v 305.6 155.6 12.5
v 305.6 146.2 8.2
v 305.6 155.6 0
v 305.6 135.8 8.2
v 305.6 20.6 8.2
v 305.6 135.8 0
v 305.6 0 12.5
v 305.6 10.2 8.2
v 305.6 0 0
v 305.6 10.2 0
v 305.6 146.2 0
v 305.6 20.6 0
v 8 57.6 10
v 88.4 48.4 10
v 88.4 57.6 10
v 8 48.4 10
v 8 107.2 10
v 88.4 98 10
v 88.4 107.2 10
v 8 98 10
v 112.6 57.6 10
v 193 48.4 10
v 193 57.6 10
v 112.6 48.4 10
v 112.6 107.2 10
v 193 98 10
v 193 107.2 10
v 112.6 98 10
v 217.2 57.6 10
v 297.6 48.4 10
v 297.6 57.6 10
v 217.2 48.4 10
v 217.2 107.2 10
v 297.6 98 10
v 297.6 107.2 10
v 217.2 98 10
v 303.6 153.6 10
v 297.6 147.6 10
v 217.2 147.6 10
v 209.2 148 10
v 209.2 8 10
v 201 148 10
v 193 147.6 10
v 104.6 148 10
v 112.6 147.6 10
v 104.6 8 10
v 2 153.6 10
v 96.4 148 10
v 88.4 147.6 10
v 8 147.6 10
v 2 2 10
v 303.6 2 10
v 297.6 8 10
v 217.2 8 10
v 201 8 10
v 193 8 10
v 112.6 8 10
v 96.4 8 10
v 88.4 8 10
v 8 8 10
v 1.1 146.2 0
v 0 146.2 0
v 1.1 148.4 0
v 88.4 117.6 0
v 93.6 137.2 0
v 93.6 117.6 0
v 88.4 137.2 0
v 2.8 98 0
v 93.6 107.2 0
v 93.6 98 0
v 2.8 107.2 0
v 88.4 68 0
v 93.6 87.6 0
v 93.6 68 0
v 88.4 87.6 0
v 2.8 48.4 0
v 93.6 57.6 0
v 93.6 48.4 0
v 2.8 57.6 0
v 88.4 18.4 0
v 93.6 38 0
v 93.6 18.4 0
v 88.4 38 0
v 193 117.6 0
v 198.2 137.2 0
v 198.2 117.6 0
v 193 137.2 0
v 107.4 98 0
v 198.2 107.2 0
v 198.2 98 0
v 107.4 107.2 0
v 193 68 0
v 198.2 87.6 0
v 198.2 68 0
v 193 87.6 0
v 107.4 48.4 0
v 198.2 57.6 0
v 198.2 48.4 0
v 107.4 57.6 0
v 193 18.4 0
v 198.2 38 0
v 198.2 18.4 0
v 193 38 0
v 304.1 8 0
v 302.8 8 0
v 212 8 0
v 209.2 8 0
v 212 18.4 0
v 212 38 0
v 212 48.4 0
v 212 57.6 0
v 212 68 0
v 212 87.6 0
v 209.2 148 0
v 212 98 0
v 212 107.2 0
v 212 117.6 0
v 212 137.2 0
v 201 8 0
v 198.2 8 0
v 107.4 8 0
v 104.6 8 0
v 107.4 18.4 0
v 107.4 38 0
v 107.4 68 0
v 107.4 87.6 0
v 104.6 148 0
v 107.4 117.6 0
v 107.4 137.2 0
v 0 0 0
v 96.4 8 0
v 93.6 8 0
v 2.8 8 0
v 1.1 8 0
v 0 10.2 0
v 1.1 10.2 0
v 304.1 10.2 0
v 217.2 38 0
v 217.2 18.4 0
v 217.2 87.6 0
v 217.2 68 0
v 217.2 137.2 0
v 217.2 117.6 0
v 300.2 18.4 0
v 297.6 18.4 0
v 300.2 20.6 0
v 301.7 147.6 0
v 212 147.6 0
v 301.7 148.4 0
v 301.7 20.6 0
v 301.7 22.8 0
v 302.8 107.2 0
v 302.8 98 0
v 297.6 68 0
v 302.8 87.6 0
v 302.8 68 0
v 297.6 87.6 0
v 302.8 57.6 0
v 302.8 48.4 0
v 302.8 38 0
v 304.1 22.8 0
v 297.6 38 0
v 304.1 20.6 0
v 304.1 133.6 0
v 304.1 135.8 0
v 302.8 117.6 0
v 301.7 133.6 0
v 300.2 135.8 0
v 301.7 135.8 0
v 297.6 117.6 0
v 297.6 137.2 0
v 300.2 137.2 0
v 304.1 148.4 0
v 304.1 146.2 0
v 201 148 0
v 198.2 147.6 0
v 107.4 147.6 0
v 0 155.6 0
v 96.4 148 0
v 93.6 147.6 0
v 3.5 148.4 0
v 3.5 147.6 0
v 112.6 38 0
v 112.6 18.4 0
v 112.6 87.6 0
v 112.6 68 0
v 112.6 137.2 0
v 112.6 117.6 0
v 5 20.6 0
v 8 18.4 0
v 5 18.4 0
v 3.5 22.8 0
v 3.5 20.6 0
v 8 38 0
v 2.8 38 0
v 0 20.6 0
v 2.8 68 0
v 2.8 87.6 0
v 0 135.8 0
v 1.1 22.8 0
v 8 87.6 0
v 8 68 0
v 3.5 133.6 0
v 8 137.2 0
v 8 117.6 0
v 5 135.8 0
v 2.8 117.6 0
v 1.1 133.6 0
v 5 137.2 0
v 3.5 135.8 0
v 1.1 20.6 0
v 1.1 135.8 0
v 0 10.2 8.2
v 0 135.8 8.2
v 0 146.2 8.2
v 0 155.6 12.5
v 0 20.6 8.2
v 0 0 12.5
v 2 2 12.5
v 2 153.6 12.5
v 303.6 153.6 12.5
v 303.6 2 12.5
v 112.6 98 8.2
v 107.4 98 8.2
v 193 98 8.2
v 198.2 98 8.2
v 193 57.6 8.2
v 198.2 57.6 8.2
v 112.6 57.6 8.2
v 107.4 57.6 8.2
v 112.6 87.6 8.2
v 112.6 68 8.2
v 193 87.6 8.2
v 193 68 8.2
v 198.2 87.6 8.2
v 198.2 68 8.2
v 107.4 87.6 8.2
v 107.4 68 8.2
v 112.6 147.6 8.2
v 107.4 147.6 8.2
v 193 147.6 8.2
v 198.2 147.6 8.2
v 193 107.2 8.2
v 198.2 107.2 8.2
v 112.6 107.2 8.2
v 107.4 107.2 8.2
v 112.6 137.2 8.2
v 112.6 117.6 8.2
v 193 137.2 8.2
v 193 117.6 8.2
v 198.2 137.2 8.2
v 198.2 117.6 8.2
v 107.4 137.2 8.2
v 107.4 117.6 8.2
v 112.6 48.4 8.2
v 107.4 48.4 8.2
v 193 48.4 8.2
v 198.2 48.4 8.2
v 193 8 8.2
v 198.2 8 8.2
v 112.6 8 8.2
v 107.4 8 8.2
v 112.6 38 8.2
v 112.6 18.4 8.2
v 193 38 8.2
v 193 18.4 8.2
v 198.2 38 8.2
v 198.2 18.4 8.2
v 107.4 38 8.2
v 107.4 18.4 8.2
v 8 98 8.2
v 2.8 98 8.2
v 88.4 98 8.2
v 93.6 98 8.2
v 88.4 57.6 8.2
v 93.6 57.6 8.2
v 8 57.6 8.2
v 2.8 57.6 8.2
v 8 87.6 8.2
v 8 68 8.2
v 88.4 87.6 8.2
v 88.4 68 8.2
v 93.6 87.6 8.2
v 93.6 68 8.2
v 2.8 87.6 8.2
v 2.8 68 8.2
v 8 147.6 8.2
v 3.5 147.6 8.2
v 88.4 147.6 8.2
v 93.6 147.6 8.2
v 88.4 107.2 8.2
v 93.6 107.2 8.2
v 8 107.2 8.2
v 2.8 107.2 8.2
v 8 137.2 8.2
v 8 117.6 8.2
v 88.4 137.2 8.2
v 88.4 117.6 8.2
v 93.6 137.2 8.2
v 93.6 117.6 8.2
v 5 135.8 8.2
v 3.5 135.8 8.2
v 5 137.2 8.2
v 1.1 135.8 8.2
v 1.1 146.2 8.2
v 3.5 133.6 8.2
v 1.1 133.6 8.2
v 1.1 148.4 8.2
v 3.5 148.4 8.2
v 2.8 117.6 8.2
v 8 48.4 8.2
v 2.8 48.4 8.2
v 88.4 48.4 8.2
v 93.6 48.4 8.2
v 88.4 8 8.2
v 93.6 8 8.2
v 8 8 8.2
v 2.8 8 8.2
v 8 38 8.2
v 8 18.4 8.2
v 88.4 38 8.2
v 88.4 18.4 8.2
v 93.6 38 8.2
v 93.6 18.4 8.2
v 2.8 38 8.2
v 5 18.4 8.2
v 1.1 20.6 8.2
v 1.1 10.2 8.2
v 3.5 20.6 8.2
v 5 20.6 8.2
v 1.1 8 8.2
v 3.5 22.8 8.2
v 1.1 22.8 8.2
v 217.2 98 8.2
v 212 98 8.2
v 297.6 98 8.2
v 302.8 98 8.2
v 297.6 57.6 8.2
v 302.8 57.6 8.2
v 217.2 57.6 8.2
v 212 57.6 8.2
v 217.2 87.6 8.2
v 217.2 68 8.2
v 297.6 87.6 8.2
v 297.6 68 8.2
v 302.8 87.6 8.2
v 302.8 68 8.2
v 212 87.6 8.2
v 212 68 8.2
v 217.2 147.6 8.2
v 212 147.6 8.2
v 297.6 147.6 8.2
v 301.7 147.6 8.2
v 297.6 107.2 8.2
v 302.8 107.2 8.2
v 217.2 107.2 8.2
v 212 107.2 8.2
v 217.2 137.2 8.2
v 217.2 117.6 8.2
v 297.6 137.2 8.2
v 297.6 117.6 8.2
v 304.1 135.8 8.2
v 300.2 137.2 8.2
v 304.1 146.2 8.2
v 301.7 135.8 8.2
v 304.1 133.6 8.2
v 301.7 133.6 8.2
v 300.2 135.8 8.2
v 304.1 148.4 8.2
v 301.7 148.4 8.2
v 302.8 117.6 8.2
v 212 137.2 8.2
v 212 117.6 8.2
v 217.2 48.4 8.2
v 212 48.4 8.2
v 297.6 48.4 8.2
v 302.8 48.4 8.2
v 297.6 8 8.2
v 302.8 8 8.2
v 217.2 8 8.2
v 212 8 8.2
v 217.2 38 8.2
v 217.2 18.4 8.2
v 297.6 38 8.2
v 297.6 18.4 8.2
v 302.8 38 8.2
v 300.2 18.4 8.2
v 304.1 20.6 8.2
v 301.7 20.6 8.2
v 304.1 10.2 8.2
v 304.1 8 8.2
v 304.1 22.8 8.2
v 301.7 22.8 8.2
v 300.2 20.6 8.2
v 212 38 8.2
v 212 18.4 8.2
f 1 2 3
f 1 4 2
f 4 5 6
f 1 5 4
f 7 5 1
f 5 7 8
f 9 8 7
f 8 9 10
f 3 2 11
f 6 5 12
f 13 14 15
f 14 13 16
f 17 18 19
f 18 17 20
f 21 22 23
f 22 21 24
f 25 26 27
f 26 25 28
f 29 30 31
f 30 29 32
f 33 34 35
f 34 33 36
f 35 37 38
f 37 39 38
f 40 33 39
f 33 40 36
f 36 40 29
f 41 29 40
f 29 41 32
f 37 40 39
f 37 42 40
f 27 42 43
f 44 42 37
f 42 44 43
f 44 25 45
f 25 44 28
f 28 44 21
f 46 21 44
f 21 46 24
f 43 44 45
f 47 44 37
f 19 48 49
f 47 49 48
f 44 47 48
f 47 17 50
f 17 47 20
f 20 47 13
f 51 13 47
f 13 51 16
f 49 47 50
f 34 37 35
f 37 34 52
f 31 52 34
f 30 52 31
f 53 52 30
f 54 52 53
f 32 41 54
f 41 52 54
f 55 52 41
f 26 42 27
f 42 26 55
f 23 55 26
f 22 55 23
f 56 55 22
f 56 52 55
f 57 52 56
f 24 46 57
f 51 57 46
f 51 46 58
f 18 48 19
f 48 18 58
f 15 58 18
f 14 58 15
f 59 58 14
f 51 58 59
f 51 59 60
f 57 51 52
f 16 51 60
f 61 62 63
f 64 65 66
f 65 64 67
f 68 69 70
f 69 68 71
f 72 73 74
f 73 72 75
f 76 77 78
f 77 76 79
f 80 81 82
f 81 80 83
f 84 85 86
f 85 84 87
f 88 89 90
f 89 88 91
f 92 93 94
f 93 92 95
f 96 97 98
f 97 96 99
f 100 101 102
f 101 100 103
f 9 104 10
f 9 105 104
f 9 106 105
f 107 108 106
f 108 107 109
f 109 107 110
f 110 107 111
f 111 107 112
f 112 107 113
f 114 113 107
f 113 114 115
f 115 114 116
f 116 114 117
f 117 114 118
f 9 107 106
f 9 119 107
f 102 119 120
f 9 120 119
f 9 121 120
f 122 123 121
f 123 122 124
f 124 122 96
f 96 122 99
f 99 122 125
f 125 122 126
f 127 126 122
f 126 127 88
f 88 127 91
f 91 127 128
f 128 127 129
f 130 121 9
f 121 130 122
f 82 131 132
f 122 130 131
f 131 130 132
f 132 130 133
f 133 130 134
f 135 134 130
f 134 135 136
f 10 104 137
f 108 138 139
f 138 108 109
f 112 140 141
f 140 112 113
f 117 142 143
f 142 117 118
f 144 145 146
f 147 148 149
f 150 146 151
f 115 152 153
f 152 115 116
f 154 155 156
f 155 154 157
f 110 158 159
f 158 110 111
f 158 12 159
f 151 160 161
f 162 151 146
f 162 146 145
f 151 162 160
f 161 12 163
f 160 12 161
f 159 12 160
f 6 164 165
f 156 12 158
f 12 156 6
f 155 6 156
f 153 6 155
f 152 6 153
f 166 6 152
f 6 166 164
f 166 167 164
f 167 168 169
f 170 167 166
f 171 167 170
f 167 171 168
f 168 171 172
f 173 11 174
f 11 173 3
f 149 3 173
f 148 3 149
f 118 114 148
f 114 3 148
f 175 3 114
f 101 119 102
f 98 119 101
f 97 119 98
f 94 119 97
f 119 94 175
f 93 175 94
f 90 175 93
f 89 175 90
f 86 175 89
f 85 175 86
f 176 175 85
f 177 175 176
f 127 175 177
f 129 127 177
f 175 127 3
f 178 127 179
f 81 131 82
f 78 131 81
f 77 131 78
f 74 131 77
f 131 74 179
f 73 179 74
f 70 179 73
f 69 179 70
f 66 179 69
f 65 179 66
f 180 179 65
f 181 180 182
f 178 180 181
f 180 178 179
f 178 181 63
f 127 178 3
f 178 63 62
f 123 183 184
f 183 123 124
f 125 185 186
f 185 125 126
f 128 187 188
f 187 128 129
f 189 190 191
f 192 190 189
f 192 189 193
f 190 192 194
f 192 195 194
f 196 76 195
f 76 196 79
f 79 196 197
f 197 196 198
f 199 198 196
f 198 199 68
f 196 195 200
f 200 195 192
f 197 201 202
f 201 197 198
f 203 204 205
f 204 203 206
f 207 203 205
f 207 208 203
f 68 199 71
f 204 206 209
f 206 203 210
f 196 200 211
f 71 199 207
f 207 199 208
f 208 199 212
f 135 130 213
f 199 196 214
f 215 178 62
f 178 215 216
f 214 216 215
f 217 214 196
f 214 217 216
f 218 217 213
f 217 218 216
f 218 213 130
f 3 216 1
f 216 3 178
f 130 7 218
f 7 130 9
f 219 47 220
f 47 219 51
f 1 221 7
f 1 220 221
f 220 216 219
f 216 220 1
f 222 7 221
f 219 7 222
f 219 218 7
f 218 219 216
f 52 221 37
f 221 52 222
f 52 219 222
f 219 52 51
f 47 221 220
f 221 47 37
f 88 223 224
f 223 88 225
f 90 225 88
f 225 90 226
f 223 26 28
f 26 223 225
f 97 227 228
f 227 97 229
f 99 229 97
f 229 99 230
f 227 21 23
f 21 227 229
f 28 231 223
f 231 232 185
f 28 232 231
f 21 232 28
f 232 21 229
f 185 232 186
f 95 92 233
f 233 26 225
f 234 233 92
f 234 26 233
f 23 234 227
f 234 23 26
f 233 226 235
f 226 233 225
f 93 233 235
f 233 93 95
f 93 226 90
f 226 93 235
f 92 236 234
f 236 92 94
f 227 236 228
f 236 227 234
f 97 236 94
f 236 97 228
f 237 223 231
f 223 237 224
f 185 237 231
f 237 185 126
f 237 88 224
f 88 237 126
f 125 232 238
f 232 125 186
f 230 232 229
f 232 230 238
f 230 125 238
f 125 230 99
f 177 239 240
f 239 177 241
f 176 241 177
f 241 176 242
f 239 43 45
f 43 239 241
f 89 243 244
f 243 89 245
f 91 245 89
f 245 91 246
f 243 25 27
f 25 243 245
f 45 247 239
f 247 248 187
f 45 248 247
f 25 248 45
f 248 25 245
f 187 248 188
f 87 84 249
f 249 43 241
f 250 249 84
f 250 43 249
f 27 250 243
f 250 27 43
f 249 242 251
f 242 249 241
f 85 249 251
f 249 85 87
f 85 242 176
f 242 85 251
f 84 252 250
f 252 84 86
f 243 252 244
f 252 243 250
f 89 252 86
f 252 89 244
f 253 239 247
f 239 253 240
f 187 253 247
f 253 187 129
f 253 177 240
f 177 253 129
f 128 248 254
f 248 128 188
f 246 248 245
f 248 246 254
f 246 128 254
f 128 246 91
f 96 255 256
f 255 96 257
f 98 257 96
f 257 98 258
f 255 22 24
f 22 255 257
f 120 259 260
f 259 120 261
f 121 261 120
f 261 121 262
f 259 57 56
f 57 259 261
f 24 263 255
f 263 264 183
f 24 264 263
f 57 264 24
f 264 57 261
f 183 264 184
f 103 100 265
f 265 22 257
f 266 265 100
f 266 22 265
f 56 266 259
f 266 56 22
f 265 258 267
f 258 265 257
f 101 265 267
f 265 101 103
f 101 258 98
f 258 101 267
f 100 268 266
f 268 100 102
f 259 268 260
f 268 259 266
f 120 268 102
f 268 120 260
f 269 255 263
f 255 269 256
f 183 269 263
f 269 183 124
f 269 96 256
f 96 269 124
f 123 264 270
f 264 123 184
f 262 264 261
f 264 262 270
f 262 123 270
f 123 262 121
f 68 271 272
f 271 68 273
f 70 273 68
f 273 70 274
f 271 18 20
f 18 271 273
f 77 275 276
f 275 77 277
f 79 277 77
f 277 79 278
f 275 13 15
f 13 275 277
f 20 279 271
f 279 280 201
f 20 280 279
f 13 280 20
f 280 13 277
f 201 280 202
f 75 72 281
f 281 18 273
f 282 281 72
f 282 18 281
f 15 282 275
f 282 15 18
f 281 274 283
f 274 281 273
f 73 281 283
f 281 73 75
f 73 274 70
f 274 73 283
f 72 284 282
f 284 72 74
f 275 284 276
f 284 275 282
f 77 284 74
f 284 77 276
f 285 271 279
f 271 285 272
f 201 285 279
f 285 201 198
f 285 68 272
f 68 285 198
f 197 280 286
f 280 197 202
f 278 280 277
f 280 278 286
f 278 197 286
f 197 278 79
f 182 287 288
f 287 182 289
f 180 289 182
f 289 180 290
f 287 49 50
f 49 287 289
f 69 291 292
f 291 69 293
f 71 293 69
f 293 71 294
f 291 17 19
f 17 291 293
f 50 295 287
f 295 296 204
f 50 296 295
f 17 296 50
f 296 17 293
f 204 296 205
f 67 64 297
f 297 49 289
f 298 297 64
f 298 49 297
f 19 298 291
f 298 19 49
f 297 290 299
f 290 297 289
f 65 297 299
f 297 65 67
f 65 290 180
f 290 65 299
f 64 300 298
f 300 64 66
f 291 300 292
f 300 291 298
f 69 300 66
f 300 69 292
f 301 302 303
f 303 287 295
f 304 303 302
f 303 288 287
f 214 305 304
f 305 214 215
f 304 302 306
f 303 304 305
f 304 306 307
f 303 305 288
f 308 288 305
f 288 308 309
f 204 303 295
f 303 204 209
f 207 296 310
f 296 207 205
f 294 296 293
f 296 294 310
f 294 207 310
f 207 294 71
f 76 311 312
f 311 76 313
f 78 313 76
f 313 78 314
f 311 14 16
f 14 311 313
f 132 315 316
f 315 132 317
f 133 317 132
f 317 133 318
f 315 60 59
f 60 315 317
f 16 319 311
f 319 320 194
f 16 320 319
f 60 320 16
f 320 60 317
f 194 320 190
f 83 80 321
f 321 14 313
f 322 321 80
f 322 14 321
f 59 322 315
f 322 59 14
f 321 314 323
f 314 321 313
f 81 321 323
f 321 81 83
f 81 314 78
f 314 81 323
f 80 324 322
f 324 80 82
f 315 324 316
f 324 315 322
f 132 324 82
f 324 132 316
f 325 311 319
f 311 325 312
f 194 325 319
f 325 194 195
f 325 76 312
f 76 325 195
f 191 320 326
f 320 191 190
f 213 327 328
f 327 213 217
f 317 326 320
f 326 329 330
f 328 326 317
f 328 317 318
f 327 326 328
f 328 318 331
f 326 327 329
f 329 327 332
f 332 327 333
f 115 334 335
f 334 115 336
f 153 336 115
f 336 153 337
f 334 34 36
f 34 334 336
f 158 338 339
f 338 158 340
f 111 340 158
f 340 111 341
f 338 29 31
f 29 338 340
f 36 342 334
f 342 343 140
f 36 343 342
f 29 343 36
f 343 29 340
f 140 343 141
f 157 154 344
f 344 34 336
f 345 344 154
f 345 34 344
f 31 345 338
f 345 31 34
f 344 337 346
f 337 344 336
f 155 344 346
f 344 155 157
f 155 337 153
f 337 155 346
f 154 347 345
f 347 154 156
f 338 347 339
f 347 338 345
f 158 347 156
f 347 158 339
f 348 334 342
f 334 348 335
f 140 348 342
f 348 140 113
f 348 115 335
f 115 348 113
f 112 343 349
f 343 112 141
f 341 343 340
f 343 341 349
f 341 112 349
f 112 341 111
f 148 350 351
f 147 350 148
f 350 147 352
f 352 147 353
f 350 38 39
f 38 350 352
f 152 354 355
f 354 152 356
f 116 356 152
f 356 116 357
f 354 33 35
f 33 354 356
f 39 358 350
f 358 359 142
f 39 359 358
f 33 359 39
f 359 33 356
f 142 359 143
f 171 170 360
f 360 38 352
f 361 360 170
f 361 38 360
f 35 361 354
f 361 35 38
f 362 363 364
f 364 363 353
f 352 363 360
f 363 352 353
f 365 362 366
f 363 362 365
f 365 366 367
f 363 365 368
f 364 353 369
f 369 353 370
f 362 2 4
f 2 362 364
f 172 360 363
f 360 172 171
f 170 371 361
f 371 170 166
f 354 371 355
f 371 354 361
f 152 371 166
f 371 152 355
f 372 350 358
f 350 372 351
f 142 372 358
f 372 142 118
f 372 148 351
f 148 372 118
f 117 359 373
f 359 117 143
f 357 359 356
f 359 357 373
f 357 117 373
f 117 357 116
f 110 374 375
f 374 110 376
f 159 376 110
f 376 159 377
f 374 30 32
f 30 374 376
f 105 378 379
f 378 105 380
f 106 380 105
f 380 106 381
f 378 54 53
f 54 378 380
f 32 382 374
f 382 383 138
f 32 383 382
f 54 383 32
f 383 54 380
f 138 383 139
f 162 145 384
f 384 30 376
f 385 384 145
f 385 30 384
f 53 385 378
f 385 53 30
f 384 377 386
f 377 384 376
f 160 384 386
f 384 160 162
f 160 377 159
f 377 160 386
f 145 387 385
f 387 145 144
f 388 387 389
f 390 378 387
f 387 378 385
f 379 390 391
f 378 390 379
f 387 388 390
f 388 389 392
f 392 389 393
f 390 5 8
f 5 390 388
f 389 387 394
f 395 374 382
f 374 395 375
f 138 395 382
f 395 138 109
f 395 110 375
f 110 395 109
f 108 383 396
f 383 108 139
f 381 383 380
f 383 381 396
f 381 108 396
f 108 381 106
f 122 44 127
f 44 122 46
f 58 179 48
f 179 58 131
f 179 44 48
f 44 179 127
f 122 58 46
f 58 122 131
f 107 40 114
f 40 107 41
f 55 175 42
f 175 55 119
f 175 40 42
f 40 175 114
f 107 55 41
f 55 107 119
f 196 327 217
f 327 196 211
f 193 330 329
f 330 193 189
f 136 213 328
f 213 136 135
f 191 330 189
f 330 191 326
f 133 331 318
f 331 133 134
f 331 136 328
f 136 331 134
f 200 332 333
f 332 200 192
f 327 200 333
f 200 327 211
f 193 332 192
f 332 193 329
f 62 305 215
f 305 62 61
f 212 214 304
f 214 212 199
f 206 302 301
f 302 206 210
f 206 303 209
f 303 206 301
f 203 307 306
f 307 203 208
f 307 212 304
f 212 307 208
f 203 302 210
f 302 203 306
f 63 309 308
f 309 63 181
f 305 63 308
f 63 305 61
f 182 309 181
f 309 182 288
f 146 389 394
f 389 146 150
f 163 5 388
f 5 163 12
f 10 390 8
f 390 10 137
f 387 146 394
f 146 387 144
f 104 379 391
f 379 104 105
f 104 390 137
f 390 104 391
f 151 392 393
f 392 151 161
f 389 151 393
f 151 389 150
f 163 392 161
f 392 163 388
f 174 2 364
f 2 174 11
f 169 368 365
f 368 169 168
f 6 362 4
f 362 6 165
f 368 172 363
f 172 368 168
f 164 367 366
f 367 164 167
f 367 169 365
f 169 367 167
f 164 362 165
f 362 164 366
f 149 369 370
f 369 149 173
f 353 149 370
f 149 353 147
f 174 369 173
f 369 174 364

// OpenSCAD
// Width of the image format
image_width = 300;
// Height of the image format
image_length = 150;
// Tolerance of the image (normally the print is a few mm bigger)
image_tolerance = 2;
// Printing Tolerance (use 0.1 to 0.2mm)
tolerance = 0.2;
// Height of the Frame (10, 20, 40, 80, etc.)
height=10;
// Height of the small image border on top of the base plate, to get a glas front between image and cover
image_border_height = 2.5;

// add 0 to some values, to hide it in the customizer UI
image_border_width = 2+0;
width=image_width+image_border_width*2+image_tolerance; // 106, 156
length=image_length+image_border_width*2+image_tolerance; // 156, 206,330
toleranced_width = width - tolerance*2;
toleranced_length = length - tolerance*2;
base_height = 8+tolerance;
y_spacing = 8+0;
x_spacing = 8+0;

// FrexyBackInsert
insert_width = 40+0;
insert_length = 80+0;
side_cube_width = 10+0;
side_cube_length = 5+0;
insert_side_width = 10+0;
insert_side_length = 5+0;
insert_side_offset = 10+0;
side_cube_insert_side_width = 2+0;
side_cube_insert_side_length = 2+0;
toleranced_insert_width = insert_width + tolerance * 2;
toleranced_insert_length = insert_length + tolerance * 2;
toleranced_side_cube_width = side_cube_width + tolerance * 2;
toleranced_side_cube_length = side_cube_length + tolerance;
toleranced_insert_side_width = insert_side_width + tolerance*2;
toleranced_insert_side_length = insert_side_length + tolerance*2;
toleranced_side_cube_insert_side_width = side_cube_insert_side_width + tolerance;
toleranced_side_cube_insert_side_length = side_cube_insert_side_length + tolerance*2;

module FrexyBackInsert(
insert_width = 40,
insert_length = 80,
side_cube_width = 10,
side_cube_length = 5,
height=10,
base_height = 8.2
) {
    union() {
        cube([insert_width, insert_length, height]);
        translate([insert_width - side_cube_width, -side_cube_length, 0])
            cube([side_cube_width, side_cube_length, base_height]);
        translate([0, -side_cube_length, 0])
            cube([side_cube_width, side_cube_length, base_height]);
        translate([insert_width - side_cube_width, insert_length, 0])
            cube([side_cube_width, side_cube_length, base_height]);
        translate([0, insert_length, 0])
            cube([side_cube_width, side_cube_length, base_height]);
    }
}

module FrexySideInsert(
width=10,
length=5,
height=8.2,
side_cube_width=2,
side_cube_length=2
) {
    translate([side_cube_width,0,0]) union() {
        cube([width,length,height]);
        translate([-side_cube_width,length/2-side_cube_length/2,0]) cube([side_cube_width,side_cube_length,height]);
        translate([width,length/2-side_cube_length/2,0]) cube([side_cube_width,side_cube_length,height]);
    }
}

x_mid = ((toleranced_width/2)+(toleranced_insert_length/2));
y_mid = ((toleranced_length/2)-(toleranced_insert_width/2));

real_y_amount = floor((toleranced_length-y_spacing)/(toleranced_insert_width+y_spacing));
real_x_amount = floor((toleranced_width-x_spacing)/(toleranced_insert_length+x_spacing));
// don't use real_y_amount, because we only want an uneven number, to have one insert always in the middle
y_amount = (real_y_amount % 2 == 0) ? real_y_amount - 1 : real_y_amount;
x_amount = (real_x_amount % 2 == 0) ? real_x_amount - 1 : real_x_amount;
echo("x amount", x_amount);
echo("y_amount", y_amount);

y_gap = (y_amount < 2) ? 0 :(toleranced_length-y_spacing*2-toleranced_insert_width*y_amount)/(y_amount-1);
x_gap = (x_amount < 2) ? 0 :(toleranced_width-x_spacing*2-toleranced_insert_length*x_amount)/(x_amount-1);
echo("x_gap", x_gap);
echo("y_gap", y_gap);
difference() {
    union() {
        // base element
        cube([toleranced_width,toleranced_length, height]);

        // image_border
        translate([0, 0, height]) cube([image_border_width,toleranced_length, image_border_height]);
        translate([toleranced_width-image_border_width, 0, height]) cube([image_border_width,toleranced_length, image_border_height]);
        translate([0, 0, height]) cube([toleranced_width, image_border_width, image_border_height]);
        translate([0, toleranced_length-image_border_width, height]) cube([toleranced_width, image_border_width, image_border_height]);
    }
    // inserts
    for (j = [0:1:x_amount-1]) {
        half_j = floor(j/2);
        for (i = [0:1:y_amount-1]) {
            half_i = floor(i/2);
            y_offset = (i == 0) ? y_mid : y_mid + ((i % 2 == 0) ? -(i-half_i):i-half_i)*(toleranced_insert_width + y_gap);
            x_offset = (j == 0) ? -x_mid : -x_mid + ((j % 2 == 0) ? -(j-half_j):j-half_j)*(toleranced_insert_length + x_gap);
            rotate([0,0,90]) translate([
                y_offset,
                x_offset,
                0
                ]) FrexyBackInsert(
            insert_width=toleranced_insert_width,
            insert_length=toleranced_insert_length,
            side_cube_width=toleranced_side_cube_width,
            side_cube_length=toleranced_side_cube_length,
            height=height,
            base_height=base_height
            );
        }
        // insert spacings
        y_insert_spacing = y_gap - y_spacing*2;
        if (y_insert_spacing > 5) {
            y_insert_spacing_mid = y_mid-y_spacing;
            for (i = [-1:1:y_amount-1-1]) {//y_amount-1-1
                x_offset = ((j == 0) ? x_mid : x_mid + ((j % 2 == 0) ? -(j-half_j):j-half_j)*(toleranced_insert_length + x_gap))-toleranced_insert_length;
                half_i = floor(i/2);
                min_plus_multiplicator = ((i == -1) ? 0 : (i % 2 == 0) ? -(i-half_i+1):i-half_i);
                current_offset = (toleranced_insert_width+y_spacing*2+y_insert_spacing) * ((i == 1) ? 1 : min_plus_multiplicator);
                echo(current_offset);
                current_y_insert_spacing_mid = y_insert_spacing_mid+current_offset;
                translate([x_offset,
                    current_y_insert_spacing_mid,
                    0])
                    rotate([0,0,-90])
                        cube([y_insert_spacing, toleranced_insert_length, height]);
            }
        }
    }

    // x spacing
    union() {
        x_insert_spacing = x_gap - x_spacing*2;
        if (x_insert_spacing > 5) {
            x_insert_spacing_mid = x_mid-y_spacing;
            for (i = [1:1:x_amount-1]) {
                current_width = x_insert_spacing;
                start_offset =
                            toleranced_insert_length+x_spacing+x_gap/2-current_width/2;
                current_offset = start_offset + (toleranced_insert_length+x_gap)*(i-1);

                translate([current_offset, y_spacing, 0]) cube([current_width, length-y_spacing*2, height]);
            }
        }
    }

    // side inserts
    rotate([0,0,90]) translate([insert_side_offset-side_cube_insert_side_width,-insert_side_length,0]) FrexySideInsert(
    width=toleranced_insert_side_width, length=toleranced_insert_side_length, height=base_height,
    side_cube_width=toleranced_side_cube_insert_side_width,
    side_cube_length=toleranced_side_cube_insert_side_length);
    rotate([0,0,90]) translate([toleranced_length-insert_side_offset-insert_side_width-side_cube_insert_side_width,-insert_side_length,0]) FrexySideInsert(
    width=toleranced_insert_side_width, length=toleranced_insert_side_length, height=base_height,
    side_cube_width=toleranced_side_cube_insert_side_width,
    side_cube_length=toleranced_side_cube_insert_side_length);

    rotate([0,0,90]) translate([insert_side_offset-side_cube_insert_side_width,-toleranced_width,0]) FrexySideInsert(
    width=toleranced_insert_side_width, length=toleranced_insert_side_length, height=base_height,
    side_cube_width=toleranced_side_cube_insert_side_width,
    side_cube_length=toleranced_side_cube_insert_side_length);
    rotate([0,0,90]) translate([toleranced_length-insert_side_offset-insert_side_width-side_cube_insert_side_width,-toleranced_width,0]) FrexySideInsert(
    width=toleranced_insert_side_width, length=toleranced_insert_side_length, height=base_height,
    side_cube_width=toleranced_side_cube_insert_side_width,
    side_cube_length=toleranced_side_cube_insert_side_length);
}
